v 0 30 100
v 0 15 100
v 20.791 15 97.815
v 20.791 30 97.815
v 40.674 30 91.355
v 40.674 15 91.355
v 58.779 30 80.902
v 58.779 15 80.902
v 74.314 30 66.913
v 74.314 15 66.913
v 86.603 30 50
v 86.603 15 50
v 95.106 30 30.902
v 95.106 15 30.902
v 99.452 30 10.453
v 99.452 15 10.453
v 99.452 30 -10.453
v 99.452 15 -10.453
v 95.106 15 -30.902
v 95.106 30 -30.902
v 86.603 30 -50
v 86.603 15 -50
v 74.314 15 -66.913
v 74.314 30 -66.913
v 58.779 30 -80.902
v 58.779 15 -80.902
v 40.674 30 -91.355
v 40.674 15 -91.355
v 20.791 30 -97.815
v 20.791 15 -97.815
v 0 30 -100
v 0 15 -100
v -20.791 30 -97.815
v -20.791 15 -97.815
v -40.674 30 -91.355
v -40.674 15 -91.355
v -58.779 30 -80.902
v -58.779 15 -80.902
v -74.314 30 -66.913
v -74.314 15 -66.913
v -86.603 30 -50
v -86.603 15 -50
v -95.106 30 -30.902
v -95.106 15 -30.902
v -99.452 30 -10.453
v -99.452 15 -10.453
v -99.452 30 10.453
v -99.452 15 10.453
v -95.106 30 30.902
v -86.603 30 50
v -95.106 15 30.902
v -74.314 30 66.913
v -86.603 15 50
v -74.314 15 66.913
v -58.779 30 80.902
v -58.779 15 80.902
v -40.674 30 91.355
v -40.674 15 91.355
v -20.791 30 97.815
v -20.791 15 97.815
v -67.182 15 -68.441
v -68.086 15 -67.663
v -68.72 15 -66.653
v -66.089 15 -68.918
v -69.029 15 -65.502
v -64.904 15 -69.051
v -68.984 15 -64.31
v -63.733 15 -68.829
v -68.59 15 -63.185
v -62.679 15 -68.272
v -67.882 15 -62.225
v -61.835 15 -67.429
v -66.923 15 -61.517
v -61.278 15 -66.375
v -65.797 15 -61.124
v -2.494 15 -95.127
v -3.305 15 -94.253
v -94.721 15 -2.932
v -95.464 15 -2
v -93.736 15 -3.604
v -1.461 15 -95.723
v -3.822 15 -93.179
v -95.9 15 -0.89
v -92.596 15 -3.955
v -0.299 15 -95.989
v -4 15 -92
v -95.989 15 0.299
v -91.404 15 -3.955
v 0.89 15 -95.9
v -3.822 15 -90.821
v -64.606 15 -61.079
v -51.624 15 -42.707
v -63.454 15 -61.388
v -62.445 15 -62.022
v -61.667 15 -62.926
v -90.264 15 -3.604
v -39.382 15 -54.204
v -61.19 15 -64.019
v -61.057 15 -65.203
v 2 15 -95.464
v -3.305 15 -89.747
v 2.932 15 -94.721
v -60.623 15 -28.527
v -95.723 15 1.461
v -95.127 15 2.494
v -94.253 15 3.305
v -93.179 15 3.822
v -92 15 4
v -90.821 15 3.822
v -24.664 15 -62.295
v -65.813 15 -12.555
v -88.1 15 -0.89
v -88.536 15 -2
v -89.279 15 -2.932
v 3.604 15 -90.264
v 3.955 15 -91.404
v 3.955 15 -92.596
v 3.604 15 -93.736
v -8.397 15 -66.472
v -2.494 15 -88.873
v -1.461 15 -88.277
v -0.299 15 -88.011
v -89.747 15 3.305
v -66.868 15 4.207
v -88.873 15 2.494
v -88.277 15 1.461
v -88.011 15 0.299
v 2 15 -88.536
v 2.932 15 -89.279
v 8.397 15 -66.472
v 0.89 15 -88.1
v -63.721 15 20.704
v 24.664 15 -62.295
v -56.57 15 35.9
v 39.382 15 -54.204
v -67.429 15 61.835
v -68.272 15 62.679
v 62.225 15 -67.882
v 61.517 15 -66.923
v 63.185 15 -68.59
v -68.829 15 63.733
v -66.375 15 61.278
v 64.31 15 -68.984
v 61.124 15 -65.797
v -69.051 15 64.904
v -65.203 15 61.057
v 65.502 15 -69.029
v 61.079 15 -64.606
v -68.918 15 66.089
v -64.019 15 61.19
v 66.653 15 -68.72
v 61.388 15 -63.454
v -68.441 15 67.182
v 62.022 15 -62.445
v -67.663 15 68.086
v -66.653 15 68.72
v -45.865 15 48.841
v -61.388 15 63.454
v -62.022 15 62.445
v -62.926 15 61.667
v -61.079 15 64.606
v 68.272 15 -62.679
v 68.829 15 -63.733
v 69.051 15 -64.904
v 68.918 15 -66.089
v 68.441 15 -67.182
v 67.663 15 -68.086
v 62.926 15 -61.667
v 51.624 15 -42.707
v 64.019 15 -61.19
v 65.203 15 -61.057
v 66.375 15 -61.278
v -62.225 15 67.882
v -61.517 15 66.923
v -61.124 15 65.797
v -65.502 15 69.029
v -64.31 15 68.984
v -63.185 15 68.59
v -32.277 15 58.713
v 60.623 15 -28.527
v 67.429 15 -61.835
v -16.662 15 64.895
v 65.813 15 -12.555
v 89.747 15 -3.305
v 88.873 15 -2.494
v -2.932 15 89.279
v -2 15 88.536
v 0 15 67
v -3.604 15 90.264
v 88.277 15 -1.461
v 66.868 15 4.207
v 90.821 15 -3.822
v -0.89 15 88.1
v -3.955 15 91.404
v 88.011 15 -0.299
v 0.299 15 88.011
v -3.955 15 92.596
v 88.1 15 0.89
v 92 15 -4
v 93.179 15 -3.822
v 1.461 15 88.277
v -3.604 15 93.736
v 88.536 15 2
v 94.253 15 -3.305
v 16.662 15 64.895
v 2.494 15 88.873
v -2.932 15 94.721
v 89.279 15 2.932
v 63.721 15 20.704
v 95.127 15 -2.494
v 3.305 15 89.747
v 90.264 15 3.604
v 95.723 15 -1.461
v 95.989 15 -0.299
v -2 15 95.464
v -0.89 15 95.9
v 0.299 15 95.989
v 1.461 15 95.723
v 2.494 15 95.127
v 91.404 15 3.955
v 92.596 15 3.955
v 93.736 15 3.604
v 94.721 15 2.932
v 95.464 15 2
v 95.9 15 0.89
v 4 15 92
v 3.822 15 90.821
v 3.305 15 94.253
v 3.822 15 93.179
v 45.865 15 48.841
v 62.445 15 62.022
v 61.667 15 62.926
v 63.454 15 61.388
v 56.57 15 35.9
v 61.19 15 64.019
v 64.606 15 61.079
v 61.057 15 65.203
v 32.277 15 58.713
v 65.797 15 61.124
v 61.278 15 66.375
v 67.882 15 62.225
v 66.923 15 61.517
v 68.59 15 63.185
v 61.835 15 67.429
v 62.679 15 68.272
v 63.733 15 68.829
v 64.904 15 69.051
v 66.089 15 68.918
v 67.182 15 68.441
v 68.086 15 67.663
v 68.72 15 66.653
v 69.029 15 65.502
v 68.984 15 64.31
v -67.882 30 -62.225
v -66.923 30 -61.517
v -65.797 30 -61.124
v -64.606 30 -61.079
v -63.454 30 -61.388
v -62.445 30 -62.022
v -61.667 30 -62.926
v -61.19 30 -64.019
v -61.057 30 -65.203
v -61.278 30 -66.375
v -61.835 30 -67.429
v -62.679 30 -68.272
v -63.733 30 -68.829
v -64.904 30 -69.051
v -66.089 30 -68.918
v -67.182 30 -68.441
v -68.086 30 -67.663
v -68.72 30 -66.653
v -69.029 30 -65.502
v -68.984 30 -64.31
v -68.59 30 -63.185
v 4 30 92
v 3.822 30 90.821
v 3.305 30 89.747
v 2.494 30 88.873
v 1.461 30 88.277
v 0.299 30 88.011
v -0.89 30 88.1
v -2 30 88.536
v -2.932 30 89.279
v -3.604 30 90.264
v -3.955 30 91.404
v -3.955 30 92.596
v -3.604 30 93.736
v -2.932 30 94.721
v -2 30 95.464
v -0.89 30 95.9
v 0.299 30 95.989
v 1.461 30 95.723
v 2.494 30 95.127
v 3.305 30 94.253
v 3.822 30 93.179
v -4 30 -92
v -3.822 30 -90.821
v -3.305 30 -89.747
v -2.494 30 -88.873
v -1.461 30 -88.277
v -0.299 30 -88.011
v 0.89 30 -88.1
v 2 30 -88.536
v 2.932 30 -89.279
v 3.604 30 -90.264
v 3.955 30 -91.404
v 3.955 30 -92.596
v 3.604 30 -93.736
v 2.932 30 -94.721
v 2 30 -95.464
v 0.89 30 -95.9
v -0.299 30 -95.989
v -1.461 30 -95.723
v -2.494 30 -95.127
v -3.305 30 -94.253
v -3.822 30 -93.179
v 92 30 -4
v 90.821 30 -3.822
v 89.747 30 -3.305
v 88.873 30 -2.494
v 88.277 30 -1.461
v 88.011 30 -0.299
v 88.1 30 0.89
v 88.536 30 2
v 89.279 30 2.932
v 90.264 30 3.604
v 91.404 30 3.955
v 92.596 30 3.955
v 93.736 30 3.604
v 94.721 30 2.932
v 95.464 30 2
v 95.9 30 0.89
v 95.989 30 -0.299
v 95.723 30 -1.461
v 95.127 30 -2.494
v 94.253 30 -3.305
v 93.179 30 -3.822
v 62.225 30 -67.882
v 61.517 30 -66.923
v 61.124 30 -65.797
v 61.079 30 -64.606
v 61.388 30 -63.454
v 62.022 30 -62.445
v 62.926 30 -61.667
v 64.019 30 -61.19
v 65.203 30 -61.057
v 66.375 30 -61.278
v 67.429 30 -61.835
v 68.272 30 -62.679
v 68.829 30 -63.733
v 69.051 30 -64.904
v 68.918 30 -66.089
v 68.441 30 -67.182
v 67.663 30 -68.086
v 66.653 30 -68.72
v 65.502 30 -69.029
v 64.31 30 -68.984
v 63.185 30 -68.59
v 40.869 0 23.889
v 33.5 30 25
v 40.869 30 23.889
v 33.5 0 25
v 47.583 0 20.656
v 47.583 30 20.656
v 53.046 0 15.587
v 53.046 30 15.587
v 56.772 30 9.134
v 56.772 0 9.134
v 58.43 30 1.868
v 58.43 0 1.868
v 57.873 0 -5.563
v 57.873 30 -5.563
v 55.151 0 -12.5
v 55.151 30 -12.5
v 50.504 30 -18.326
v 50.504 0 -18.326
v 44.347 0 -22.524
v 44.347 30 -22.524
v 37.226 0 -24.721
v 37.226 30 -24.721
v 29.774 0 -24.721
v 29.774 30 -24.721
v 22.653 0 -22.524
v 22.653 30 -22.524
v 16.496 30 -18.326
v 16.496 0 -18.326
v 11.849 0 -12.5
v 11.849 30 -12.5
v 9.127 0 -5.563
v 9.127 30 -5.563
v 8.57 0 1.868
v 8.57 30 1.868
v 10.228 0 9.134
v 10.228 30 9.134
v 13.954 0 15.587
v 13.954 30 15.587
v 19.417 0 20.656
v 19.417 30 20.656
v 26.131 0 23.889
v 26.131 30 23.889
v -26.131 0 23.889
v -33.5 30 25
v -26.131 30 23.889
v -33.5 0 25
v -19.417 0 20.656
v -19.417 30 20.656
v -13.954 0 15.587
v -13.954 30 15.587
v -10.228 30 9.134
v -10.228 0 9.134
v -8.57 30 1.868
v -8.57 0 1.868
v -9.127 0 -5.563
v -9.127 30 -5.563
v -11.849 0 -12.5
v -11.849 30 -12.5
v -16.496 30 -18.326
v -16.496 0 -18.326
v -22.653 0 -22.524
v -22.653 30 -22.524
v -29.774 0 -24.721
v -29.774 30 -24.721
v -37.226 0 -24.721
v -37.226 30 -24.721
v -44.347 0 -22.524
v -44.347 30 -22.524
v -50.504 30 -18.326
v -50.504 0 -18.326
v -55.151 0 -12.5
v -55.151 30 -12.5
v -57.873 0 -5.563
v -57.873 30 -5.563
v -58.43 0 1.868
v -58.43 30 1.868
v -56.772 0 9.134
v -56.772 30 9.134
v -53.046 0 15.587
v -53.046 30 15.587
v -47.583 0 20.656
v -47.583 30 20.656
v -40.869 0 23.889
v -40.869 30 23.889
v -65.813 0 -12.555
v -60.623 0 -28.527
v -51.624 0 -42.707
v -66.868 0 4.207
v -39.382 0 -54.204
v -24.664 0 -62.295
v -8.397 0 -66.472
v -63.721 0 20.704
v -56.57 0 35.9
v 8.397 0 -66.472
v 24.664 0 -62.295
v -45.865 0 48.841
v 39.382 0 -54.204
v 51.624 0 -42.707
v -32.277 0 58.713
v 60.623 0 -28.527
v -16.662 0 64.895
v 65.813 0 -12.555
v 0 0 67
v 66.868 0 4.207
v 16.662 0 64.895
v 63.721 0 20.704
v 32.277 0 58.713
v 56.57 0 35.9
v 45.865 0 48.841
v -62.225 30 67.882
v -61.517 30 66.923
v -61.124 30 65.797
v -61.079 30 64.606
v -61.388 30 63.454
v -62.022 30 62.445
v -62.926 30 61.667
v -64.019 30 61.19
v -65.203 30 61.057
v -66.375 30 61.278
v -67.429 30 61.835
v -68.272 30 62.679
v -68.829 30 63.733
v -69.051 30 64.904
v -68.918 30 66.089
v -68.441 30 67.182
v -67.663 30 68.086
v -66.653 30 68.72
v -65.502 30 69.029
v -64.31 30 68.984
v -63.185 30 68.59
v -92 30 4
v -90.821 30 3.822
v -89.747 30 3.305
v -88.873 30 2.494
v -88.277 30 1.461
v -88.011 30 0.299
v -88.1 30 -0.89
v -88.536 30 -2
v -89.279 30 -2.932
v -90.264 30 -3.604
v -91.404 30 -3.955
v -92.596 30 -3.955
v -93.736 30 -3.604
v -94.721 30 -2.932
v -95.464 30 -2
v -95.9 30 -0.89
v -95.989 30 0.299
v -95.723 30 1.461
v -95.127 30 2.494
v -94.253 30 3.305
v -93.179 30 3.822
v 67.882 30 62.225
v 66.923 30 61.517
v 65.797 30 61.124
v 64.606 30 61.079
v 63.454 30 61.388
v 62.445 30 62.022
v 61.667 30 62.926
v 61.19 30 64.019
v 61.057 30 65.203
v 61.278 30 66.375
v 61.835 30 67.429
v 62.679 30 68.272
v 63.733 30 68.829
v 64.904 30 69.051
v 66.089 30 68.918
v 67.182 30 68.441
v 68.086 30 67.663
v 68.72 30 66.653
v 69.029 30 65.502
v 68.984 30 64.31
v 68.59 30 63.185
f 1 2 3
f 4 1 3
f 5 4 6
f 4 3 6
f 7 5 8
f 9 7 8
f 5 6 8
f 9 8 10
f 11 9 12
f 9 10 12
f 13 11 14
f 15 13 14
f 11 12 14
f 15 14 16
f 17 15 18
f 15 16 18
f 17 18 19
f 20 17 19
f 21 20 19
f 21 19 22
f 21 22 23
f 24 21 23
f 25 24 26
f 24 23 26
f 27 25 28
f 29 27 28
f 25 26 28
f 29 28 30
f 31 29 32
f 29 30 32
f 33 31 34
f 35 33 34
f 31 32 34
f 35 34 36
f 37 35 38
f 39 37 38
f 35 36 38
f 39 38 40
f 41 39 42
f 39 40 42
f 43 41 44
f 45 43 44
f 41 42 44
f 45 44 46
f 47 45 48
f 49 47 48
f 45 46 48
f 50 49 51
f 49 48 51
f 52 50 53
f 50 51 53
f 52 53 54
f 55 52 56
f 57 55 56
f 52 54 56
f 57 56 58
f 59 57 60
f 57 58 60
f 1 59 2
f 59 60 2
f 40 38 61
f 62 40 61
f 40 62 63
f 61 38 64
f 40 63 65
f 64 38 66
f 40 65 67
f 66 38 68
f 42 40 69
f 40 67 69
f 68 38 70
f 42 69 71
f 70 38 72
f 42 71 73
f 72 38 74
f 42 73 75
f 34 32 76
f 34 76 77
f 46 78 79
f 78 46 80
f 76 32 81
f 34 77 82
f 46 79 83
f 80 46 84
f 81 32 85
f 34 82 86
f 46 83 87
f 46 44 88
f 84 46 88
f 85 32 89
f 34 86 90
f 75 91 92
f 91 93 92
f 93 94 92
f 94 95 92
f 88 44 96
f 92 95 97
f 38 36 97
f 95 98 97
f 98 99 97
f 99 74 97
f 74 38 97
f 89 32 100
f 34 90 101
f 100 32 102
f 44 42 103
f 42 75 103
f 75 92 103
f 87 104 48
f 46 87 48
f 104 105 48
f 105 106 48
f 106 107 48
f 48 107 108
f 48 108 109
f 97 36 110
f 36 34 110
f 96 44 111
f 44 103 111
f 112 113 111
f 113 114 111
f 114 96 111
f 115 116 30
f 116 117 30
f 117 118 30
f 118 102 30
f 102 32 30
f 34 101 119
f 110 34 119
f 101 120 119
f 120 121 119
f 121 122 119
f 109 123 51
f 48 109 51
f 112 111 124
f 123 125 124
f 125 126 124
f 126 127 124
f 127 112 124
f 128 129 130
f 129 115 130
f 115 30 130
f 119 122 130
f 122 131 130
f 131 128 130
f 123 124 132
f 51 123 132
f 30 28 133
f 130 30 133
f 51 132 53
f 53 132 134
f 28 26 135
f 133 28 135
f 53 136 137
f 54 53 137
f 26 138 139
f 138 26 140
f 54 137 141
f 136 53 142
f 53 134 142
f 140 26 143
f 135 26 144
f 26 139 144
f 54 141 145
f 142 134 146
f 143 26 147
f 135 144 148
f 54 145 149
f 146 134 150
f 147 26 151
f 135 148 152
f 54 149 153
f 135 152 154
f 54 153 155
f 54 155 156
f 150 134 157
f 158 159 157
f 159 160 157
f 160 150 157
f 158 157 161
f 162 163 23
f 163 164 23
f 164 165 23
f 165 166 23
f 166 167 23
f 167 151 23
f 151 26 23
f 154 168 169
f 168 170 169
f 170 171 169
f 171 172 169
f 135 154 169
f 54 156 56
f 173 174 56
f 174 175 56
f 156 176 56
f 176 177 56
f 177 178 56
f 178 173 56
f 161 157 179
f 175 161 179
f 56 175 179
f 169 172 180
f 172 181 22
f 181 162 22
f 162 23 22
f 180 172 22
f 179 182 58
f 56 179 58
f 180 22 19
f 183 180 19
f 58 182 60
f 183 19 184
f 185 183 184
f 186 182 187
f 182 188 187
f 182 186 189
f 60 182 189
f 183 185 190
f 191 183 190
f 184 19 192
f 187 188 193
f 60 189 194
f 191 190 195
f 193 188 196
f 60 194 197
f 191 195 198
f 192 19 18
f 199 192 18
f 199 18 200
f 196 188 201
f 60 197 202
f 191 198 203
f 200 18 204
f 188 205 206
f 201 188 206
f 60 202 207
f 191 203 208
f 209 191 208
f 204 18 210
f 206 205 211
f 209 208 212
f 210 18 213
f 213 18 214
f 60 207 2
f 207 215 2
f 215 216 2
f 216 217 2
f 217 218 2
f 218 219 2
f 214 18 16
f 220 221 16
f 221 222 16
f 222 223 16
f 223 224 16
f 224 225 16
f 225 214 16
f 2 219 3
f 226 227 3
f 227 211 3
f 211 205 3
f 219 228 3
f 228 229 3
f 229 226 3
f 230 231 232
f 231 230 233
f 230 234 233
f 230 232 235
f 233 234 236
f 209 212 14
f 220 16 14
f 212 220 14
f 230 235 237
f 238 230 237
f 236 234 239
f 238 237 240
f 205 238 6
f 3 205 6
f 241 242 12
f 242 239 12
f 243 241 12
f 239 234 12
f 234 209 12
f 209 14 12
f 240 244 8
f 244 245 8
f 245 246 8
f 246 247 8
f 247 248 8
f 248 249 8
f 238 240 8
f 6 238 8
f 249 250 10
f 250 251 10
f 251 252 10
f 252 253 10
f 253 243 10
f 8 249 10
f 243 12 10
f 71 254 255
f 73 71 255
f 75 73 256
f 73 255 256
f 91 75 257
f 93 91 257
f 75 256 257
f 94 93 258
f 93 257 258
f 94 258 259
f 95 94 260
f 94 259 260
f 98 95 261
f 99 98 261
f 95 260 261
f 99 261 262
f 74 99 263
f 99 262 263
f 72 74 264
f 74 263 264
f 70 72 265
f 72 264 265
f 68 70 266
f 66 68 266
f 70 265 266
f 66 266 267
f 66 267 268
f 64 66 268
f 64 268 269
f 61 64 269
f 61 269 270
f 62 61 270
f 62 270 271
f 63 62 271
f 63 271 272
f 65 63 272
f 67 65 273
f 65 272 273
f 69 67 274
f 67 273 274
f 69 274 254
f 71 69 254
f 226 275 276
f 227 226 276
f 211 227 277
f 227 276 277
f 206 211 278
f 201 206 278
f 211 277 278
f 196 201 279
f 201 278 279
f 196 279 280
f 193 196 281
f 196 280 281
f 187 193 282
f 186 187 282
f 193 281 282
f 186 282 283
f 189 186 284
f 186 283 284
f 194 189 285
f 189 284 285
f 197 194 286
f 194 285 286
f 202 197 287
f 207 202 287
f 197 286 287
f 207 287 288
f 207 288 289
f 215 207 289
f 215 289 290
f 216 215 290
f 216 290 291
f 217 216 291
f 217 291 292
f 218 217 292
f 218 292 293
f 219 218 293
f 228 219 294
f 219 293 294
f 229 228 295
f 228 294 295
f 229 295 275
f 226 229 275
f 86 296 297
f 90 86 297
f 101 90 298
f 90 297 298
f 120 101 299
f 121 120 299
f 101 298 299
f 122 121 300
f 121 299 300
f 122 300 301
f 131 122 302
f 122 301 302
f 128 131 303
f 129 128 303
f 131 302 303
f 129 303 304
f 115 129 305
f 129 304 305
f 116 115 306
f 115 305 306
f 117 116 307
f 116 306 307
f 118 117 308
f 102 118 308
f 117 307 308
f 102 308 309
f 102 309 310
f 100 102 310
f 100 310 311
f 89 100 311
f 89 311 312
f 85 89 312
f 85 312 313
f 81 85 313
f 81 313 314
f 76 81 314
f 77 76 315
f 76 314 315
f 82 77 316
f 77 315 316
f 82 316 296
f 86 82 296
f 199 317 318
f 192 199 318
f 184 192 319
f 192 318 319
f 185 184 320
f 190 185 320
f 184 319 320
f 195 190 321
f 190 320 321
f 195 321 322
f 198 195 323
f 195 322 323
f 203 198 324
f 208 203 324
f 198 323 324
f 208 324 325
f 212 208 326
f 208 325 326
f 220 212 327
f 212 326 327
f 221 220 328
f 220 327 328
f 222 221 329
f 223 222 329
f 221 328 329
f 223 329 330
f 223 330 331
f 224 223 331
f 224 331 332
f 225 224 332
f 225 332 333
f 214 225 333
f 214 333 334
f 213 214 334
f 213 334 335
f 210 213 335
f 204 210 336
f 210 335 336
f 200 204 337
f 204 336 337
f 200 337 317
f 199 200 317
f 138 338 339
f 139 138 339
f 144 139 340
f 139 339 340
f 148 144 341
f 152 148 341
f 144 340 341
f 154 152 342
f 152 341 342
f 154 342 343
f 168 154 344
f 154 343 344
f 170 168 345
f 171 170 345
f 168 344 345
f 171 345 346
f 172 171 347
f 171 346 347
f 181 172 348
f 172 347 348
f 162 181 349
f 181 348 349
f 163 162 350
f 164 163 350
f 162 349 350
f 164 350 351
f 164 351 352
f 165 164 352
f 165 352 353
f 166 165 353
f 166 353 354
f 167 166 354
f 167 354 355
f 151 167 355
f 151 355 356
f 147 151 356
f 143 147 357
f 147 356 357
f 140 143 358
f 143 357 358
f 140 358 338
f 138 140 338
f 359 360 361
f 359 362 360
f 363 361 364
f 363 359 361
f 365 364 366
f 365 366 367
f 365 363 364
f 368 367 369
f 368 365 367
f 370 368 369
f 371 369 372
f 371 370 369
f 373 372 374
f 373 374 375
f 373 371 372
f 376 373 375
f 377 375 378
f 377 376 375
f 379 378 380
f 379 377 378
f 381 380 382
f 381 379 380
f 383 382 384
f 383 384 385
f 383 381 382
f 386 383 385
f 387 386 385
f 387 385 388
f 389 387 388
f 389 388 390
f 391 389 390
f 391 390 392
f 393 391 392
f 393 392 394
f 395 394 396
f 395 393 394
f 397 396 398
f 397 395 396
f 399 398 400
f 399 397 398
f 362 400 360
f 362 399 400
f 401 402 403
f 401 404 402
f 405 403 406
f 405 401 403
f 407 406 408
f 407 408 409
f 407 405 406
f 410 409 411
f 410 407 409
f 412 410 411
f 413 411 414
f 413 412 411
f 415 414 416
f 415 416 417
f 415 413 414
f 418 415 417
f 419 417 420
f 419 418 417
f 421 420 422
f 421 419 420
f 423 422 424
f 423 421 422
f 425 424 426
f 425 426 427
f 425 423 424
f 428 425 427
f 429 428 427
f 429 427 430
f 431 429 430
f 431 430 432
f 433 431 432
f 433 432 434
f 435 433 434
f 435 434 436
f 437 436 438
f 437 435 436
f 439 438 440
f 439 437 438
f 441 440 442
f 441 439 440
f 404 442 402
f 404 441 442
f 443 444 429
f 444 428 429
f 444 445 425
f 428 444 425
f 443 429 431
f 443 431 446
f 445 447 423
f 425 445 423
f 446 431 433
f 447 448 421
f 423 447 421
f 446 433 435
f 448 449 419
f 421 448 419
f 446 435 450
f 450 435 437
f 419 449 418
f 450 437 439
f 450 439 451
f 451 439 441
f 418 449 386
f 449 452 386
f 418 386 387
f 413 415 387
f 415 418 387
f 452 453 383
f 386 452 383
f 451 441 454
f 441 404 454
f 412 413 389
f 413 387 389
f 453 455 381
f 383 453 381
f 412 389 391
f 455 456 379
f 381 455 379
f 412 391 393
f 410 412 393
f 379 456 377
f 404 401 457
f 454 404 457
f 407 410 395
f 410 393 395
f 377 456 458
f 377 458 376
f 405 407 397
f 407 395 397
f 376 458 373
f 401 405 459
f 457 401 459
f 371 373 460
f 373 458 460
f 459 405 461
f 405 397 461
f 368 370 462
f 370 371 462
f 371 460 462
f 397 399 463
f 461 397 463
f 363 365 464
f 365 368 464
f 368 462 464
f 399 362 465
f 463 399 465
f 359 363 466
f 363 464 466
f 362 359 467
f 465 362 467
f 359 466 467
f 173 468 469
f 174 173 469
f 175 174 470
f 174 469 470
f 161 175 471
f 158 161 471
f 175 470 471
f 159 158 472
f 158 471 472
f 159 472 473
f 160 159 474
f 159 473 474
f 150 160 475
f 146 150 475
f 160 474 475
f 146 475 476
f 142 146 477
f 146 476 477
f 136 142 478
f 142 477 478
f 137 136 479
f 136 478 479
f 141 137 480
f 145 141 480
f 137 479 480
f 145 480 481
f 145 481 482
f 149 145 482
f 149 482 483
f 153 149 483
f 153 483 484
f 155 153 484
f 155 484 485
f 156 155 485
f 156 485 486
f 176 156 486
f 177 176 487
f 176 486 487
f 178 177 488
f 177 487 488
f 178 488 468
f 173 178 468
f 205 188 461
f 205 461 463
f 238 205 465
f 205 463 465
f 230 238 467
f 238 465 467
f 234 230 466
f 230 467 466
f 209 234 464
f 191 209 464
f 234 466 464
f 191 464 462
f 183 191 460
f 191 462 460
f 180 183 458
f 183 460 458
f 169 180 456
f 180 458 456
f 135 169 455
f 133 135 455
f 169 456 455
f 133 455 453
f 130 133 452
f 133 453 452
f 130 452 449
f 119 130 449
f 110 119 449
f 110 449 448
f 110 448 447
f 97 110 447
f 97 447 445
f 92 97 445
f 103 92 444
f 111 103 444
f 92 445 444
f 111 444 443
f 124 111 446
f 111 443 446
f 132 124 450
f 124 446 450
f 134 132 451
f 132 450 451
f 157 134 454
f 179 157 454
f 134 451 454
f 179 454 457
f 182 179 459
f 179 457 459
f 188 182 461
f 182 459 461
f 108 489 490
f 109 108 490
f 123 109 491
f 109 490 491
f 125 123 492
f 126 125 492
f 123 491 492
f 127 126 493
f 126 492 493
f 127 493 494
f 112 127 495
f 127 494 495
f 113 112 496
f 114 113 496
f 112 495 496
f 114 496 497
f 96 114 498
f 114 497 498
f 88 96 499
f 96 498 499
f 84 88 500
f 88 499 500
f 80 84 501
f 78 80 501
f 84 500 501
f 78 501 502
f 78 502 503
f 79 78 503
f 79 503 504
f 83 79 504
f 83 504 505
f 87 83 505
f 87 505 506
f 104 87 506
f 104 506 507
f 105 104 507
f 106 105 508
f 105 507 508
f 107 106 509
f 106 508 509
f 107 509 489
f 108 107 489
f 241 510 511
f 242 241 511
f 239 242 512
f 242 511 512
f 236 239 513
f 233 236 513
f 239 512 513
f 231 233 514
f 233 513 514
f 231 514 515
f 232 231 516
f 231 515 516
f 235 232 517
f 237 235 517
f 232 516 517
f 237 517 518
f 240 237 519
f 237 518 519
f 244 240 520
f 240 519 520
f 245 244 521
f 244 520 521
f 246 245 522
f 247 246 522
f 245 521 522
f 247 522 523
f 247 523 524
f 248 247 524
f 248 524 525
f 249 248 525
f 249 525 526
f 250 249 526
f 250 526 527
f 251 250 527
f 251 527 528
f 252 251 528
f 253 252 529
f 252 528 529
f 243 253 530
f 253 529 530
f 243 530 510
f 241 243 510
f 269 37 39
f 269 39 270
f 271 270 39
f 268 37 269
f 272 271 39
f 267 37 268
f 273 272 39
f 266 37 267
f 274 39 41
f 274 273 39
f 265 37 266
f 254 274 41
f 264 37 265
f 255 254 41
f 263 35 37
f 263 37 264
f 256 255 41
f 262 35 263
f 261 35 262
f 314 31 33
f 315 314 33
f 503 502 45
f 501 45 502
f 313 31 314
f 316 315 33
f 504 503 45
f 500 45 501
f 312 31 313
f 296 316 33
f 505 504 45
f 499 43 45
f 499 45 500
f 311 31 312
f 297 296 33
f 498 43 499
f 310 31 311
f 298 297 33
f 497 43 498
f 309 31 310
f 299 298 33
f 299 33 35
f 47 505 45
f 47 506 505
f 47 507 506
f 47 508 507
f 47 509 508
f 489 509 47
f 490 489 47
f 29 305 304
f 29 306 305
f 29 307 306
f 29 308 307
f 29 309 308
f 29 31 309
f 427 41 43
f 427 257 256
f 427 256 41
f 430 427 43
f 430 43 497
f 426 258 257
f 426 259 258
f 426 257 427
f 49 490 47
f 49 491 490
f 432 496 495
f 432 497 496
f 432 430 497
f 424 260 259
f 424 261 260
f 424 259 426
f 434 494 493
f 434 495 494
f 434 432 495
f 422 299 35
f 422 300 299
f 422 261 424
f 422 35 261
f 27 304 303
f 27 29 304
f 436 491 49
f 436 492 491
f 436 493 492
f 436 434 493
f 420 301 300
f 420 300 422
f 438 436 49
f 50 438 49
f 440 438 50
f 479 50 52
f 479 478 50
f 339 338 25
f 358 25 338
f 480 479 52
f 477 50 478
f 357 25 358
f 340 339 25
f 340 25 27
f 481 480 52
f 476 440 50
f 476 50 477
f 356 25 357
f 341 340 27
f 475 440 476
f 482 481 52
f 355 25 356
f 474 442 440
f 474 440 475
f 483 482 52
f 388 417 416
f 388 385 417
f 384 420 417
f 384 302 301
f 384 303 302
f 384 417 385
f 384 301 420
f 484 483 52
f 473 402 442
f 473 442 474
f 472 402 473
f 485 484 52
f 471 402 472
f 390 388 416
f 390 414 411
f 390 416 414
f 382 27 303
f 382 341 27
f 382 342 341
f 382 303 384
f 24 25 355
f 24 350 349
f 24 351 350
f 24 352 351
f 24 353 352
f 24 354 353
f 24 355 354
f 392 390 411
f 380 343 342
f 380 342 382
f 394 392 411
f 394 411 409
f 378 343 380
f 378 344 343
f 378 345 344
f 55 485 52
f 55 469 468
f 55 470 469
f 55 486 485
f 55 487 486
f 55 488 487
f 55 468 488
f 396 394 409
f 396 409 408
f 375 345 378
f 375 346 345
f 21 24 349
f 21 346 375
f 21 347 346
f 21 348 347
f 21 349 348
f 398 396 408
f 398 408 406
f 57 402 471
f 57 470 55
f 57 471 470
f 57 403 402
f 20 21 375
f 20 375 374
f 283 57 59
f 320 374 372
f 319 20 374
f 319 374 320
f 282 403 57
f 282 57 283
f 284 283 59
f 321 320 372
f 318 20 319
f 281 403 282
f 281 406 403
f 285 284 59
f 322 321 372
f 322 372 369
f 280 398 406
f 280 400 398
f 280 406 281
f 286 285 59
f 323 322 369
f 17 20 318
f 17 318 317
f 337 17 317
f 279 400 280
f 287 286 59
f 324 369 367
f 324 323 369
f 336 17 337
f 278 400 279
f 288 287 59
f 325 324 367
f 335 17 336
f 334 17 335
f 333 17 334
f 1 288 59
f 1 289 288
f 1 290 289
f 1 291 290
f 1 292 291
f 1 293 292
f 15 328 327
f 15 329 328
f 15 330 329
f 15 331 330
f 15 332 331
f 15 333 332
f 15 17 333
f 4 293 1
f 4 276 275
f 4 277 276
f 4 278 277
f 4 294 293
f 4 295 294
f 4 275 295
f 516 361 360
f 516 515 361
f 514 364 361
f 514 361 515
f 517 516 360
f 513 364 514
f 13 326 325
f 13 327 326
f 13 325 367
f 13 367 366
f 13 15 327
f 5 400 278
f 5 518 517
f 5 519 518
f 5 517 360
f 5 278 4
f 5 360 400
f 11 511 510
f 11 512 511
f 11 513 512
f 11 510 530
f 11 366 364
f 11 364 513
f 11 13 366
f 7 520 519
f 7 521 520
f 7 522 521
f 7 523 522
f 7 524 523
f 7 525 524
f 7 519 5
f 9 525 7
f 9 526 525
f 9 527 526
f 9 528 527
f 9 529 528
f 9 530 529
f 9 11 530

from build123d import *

# Parameters (mm, degrees)
SKETCH1_R           = 67
SKETCH1_R_2         = 25
BOSS_EXTRUDE1_DEPTH = 15
SKETCH2_R           = 100
SKETCH2_R_2         = 25
BOSS_EXTRUDE2_DEPTH = 15
SKETCH4_R           = 4
CUT_EXTRUDE2_DEPTH  = 15
CIRPATTERN1_COUNT   = 8


with BuildPart() as part:
    # Sketch1 → Boss-Extrude1 (new body)
    with BuildSketch(Plane(origin=(0, 0, 0), x_dir=(1, 0, 0), z_dir=(0, 1, 0))):
        with Locations(Location((0, 0, 0), (0, 0, 270))):
            Circle(SKETCH1_R)
        with Locations(Location((-33.5, 0, 0), (0, 0, 270))):
            Circle(SKETCH1_R_2, mode=Mode.SUBTRACT)
        with Locations(Location((33.5, 0, 0), (0, 0, 270))):
            Circle(SKETCH1_R_2, mode=Mode.SUBTRACT)
    extrude(amount=BOSS_EXTRUDE1_DEPTH)

    # Sketch2 → Boss-Extrude2 (add)
    with BuildSketch(Plane(origin=(0, 15, 0), x_dir=(1, 0, 0), z_dir=(0, 1, 0))):
        with Locations(Location((0, 0, 0), (0, 0, 270))):
            Circle(SKETCH2_R)
        with Locations(Location((33.5, 0, 0), (0, 0, 270))):
            Circle(SKETCH2_R_2, mode=Mode.SUBTRACT)
        with Locations(Location((-33.5, 0, 0), (0, 0, 270))):
            Circle(SKETCH2_R_2, mode=Mode.SUBTRACT)
    extrude(amount=BOSS_EXTRUDE2_DEPTH)

    # Sketch4 → Cut-Extrude2 (cut)
    with BuildSketch(Plane(origin=(0, 30, 0), x_dir=(1, 0, 0), z_dir=(0, 1, 0))):
        with Locations(Location((-92, 0, 0), (0, 0, 270))):
            Circle(SKETCH4_R)
    cut_extrude2 = extrude(amount=-CUT_EXTRUDE2_DEPTH, mode=Mode.SUBTRACT)

    # CirPattern1: Cut-Extrude2 ×8 about axis
    cirpattern1_axis = Axis((0, 0, 0), (0, 1, 0))
    for i in range(1, CIRPATTERN1_COUNT):
        add(cut_extrude2.rotate(cirpattern1_axis, i * 360 / CIRPATTERN1_COUNT), mode=Mode.SUBTRACT)


solid = part.part
